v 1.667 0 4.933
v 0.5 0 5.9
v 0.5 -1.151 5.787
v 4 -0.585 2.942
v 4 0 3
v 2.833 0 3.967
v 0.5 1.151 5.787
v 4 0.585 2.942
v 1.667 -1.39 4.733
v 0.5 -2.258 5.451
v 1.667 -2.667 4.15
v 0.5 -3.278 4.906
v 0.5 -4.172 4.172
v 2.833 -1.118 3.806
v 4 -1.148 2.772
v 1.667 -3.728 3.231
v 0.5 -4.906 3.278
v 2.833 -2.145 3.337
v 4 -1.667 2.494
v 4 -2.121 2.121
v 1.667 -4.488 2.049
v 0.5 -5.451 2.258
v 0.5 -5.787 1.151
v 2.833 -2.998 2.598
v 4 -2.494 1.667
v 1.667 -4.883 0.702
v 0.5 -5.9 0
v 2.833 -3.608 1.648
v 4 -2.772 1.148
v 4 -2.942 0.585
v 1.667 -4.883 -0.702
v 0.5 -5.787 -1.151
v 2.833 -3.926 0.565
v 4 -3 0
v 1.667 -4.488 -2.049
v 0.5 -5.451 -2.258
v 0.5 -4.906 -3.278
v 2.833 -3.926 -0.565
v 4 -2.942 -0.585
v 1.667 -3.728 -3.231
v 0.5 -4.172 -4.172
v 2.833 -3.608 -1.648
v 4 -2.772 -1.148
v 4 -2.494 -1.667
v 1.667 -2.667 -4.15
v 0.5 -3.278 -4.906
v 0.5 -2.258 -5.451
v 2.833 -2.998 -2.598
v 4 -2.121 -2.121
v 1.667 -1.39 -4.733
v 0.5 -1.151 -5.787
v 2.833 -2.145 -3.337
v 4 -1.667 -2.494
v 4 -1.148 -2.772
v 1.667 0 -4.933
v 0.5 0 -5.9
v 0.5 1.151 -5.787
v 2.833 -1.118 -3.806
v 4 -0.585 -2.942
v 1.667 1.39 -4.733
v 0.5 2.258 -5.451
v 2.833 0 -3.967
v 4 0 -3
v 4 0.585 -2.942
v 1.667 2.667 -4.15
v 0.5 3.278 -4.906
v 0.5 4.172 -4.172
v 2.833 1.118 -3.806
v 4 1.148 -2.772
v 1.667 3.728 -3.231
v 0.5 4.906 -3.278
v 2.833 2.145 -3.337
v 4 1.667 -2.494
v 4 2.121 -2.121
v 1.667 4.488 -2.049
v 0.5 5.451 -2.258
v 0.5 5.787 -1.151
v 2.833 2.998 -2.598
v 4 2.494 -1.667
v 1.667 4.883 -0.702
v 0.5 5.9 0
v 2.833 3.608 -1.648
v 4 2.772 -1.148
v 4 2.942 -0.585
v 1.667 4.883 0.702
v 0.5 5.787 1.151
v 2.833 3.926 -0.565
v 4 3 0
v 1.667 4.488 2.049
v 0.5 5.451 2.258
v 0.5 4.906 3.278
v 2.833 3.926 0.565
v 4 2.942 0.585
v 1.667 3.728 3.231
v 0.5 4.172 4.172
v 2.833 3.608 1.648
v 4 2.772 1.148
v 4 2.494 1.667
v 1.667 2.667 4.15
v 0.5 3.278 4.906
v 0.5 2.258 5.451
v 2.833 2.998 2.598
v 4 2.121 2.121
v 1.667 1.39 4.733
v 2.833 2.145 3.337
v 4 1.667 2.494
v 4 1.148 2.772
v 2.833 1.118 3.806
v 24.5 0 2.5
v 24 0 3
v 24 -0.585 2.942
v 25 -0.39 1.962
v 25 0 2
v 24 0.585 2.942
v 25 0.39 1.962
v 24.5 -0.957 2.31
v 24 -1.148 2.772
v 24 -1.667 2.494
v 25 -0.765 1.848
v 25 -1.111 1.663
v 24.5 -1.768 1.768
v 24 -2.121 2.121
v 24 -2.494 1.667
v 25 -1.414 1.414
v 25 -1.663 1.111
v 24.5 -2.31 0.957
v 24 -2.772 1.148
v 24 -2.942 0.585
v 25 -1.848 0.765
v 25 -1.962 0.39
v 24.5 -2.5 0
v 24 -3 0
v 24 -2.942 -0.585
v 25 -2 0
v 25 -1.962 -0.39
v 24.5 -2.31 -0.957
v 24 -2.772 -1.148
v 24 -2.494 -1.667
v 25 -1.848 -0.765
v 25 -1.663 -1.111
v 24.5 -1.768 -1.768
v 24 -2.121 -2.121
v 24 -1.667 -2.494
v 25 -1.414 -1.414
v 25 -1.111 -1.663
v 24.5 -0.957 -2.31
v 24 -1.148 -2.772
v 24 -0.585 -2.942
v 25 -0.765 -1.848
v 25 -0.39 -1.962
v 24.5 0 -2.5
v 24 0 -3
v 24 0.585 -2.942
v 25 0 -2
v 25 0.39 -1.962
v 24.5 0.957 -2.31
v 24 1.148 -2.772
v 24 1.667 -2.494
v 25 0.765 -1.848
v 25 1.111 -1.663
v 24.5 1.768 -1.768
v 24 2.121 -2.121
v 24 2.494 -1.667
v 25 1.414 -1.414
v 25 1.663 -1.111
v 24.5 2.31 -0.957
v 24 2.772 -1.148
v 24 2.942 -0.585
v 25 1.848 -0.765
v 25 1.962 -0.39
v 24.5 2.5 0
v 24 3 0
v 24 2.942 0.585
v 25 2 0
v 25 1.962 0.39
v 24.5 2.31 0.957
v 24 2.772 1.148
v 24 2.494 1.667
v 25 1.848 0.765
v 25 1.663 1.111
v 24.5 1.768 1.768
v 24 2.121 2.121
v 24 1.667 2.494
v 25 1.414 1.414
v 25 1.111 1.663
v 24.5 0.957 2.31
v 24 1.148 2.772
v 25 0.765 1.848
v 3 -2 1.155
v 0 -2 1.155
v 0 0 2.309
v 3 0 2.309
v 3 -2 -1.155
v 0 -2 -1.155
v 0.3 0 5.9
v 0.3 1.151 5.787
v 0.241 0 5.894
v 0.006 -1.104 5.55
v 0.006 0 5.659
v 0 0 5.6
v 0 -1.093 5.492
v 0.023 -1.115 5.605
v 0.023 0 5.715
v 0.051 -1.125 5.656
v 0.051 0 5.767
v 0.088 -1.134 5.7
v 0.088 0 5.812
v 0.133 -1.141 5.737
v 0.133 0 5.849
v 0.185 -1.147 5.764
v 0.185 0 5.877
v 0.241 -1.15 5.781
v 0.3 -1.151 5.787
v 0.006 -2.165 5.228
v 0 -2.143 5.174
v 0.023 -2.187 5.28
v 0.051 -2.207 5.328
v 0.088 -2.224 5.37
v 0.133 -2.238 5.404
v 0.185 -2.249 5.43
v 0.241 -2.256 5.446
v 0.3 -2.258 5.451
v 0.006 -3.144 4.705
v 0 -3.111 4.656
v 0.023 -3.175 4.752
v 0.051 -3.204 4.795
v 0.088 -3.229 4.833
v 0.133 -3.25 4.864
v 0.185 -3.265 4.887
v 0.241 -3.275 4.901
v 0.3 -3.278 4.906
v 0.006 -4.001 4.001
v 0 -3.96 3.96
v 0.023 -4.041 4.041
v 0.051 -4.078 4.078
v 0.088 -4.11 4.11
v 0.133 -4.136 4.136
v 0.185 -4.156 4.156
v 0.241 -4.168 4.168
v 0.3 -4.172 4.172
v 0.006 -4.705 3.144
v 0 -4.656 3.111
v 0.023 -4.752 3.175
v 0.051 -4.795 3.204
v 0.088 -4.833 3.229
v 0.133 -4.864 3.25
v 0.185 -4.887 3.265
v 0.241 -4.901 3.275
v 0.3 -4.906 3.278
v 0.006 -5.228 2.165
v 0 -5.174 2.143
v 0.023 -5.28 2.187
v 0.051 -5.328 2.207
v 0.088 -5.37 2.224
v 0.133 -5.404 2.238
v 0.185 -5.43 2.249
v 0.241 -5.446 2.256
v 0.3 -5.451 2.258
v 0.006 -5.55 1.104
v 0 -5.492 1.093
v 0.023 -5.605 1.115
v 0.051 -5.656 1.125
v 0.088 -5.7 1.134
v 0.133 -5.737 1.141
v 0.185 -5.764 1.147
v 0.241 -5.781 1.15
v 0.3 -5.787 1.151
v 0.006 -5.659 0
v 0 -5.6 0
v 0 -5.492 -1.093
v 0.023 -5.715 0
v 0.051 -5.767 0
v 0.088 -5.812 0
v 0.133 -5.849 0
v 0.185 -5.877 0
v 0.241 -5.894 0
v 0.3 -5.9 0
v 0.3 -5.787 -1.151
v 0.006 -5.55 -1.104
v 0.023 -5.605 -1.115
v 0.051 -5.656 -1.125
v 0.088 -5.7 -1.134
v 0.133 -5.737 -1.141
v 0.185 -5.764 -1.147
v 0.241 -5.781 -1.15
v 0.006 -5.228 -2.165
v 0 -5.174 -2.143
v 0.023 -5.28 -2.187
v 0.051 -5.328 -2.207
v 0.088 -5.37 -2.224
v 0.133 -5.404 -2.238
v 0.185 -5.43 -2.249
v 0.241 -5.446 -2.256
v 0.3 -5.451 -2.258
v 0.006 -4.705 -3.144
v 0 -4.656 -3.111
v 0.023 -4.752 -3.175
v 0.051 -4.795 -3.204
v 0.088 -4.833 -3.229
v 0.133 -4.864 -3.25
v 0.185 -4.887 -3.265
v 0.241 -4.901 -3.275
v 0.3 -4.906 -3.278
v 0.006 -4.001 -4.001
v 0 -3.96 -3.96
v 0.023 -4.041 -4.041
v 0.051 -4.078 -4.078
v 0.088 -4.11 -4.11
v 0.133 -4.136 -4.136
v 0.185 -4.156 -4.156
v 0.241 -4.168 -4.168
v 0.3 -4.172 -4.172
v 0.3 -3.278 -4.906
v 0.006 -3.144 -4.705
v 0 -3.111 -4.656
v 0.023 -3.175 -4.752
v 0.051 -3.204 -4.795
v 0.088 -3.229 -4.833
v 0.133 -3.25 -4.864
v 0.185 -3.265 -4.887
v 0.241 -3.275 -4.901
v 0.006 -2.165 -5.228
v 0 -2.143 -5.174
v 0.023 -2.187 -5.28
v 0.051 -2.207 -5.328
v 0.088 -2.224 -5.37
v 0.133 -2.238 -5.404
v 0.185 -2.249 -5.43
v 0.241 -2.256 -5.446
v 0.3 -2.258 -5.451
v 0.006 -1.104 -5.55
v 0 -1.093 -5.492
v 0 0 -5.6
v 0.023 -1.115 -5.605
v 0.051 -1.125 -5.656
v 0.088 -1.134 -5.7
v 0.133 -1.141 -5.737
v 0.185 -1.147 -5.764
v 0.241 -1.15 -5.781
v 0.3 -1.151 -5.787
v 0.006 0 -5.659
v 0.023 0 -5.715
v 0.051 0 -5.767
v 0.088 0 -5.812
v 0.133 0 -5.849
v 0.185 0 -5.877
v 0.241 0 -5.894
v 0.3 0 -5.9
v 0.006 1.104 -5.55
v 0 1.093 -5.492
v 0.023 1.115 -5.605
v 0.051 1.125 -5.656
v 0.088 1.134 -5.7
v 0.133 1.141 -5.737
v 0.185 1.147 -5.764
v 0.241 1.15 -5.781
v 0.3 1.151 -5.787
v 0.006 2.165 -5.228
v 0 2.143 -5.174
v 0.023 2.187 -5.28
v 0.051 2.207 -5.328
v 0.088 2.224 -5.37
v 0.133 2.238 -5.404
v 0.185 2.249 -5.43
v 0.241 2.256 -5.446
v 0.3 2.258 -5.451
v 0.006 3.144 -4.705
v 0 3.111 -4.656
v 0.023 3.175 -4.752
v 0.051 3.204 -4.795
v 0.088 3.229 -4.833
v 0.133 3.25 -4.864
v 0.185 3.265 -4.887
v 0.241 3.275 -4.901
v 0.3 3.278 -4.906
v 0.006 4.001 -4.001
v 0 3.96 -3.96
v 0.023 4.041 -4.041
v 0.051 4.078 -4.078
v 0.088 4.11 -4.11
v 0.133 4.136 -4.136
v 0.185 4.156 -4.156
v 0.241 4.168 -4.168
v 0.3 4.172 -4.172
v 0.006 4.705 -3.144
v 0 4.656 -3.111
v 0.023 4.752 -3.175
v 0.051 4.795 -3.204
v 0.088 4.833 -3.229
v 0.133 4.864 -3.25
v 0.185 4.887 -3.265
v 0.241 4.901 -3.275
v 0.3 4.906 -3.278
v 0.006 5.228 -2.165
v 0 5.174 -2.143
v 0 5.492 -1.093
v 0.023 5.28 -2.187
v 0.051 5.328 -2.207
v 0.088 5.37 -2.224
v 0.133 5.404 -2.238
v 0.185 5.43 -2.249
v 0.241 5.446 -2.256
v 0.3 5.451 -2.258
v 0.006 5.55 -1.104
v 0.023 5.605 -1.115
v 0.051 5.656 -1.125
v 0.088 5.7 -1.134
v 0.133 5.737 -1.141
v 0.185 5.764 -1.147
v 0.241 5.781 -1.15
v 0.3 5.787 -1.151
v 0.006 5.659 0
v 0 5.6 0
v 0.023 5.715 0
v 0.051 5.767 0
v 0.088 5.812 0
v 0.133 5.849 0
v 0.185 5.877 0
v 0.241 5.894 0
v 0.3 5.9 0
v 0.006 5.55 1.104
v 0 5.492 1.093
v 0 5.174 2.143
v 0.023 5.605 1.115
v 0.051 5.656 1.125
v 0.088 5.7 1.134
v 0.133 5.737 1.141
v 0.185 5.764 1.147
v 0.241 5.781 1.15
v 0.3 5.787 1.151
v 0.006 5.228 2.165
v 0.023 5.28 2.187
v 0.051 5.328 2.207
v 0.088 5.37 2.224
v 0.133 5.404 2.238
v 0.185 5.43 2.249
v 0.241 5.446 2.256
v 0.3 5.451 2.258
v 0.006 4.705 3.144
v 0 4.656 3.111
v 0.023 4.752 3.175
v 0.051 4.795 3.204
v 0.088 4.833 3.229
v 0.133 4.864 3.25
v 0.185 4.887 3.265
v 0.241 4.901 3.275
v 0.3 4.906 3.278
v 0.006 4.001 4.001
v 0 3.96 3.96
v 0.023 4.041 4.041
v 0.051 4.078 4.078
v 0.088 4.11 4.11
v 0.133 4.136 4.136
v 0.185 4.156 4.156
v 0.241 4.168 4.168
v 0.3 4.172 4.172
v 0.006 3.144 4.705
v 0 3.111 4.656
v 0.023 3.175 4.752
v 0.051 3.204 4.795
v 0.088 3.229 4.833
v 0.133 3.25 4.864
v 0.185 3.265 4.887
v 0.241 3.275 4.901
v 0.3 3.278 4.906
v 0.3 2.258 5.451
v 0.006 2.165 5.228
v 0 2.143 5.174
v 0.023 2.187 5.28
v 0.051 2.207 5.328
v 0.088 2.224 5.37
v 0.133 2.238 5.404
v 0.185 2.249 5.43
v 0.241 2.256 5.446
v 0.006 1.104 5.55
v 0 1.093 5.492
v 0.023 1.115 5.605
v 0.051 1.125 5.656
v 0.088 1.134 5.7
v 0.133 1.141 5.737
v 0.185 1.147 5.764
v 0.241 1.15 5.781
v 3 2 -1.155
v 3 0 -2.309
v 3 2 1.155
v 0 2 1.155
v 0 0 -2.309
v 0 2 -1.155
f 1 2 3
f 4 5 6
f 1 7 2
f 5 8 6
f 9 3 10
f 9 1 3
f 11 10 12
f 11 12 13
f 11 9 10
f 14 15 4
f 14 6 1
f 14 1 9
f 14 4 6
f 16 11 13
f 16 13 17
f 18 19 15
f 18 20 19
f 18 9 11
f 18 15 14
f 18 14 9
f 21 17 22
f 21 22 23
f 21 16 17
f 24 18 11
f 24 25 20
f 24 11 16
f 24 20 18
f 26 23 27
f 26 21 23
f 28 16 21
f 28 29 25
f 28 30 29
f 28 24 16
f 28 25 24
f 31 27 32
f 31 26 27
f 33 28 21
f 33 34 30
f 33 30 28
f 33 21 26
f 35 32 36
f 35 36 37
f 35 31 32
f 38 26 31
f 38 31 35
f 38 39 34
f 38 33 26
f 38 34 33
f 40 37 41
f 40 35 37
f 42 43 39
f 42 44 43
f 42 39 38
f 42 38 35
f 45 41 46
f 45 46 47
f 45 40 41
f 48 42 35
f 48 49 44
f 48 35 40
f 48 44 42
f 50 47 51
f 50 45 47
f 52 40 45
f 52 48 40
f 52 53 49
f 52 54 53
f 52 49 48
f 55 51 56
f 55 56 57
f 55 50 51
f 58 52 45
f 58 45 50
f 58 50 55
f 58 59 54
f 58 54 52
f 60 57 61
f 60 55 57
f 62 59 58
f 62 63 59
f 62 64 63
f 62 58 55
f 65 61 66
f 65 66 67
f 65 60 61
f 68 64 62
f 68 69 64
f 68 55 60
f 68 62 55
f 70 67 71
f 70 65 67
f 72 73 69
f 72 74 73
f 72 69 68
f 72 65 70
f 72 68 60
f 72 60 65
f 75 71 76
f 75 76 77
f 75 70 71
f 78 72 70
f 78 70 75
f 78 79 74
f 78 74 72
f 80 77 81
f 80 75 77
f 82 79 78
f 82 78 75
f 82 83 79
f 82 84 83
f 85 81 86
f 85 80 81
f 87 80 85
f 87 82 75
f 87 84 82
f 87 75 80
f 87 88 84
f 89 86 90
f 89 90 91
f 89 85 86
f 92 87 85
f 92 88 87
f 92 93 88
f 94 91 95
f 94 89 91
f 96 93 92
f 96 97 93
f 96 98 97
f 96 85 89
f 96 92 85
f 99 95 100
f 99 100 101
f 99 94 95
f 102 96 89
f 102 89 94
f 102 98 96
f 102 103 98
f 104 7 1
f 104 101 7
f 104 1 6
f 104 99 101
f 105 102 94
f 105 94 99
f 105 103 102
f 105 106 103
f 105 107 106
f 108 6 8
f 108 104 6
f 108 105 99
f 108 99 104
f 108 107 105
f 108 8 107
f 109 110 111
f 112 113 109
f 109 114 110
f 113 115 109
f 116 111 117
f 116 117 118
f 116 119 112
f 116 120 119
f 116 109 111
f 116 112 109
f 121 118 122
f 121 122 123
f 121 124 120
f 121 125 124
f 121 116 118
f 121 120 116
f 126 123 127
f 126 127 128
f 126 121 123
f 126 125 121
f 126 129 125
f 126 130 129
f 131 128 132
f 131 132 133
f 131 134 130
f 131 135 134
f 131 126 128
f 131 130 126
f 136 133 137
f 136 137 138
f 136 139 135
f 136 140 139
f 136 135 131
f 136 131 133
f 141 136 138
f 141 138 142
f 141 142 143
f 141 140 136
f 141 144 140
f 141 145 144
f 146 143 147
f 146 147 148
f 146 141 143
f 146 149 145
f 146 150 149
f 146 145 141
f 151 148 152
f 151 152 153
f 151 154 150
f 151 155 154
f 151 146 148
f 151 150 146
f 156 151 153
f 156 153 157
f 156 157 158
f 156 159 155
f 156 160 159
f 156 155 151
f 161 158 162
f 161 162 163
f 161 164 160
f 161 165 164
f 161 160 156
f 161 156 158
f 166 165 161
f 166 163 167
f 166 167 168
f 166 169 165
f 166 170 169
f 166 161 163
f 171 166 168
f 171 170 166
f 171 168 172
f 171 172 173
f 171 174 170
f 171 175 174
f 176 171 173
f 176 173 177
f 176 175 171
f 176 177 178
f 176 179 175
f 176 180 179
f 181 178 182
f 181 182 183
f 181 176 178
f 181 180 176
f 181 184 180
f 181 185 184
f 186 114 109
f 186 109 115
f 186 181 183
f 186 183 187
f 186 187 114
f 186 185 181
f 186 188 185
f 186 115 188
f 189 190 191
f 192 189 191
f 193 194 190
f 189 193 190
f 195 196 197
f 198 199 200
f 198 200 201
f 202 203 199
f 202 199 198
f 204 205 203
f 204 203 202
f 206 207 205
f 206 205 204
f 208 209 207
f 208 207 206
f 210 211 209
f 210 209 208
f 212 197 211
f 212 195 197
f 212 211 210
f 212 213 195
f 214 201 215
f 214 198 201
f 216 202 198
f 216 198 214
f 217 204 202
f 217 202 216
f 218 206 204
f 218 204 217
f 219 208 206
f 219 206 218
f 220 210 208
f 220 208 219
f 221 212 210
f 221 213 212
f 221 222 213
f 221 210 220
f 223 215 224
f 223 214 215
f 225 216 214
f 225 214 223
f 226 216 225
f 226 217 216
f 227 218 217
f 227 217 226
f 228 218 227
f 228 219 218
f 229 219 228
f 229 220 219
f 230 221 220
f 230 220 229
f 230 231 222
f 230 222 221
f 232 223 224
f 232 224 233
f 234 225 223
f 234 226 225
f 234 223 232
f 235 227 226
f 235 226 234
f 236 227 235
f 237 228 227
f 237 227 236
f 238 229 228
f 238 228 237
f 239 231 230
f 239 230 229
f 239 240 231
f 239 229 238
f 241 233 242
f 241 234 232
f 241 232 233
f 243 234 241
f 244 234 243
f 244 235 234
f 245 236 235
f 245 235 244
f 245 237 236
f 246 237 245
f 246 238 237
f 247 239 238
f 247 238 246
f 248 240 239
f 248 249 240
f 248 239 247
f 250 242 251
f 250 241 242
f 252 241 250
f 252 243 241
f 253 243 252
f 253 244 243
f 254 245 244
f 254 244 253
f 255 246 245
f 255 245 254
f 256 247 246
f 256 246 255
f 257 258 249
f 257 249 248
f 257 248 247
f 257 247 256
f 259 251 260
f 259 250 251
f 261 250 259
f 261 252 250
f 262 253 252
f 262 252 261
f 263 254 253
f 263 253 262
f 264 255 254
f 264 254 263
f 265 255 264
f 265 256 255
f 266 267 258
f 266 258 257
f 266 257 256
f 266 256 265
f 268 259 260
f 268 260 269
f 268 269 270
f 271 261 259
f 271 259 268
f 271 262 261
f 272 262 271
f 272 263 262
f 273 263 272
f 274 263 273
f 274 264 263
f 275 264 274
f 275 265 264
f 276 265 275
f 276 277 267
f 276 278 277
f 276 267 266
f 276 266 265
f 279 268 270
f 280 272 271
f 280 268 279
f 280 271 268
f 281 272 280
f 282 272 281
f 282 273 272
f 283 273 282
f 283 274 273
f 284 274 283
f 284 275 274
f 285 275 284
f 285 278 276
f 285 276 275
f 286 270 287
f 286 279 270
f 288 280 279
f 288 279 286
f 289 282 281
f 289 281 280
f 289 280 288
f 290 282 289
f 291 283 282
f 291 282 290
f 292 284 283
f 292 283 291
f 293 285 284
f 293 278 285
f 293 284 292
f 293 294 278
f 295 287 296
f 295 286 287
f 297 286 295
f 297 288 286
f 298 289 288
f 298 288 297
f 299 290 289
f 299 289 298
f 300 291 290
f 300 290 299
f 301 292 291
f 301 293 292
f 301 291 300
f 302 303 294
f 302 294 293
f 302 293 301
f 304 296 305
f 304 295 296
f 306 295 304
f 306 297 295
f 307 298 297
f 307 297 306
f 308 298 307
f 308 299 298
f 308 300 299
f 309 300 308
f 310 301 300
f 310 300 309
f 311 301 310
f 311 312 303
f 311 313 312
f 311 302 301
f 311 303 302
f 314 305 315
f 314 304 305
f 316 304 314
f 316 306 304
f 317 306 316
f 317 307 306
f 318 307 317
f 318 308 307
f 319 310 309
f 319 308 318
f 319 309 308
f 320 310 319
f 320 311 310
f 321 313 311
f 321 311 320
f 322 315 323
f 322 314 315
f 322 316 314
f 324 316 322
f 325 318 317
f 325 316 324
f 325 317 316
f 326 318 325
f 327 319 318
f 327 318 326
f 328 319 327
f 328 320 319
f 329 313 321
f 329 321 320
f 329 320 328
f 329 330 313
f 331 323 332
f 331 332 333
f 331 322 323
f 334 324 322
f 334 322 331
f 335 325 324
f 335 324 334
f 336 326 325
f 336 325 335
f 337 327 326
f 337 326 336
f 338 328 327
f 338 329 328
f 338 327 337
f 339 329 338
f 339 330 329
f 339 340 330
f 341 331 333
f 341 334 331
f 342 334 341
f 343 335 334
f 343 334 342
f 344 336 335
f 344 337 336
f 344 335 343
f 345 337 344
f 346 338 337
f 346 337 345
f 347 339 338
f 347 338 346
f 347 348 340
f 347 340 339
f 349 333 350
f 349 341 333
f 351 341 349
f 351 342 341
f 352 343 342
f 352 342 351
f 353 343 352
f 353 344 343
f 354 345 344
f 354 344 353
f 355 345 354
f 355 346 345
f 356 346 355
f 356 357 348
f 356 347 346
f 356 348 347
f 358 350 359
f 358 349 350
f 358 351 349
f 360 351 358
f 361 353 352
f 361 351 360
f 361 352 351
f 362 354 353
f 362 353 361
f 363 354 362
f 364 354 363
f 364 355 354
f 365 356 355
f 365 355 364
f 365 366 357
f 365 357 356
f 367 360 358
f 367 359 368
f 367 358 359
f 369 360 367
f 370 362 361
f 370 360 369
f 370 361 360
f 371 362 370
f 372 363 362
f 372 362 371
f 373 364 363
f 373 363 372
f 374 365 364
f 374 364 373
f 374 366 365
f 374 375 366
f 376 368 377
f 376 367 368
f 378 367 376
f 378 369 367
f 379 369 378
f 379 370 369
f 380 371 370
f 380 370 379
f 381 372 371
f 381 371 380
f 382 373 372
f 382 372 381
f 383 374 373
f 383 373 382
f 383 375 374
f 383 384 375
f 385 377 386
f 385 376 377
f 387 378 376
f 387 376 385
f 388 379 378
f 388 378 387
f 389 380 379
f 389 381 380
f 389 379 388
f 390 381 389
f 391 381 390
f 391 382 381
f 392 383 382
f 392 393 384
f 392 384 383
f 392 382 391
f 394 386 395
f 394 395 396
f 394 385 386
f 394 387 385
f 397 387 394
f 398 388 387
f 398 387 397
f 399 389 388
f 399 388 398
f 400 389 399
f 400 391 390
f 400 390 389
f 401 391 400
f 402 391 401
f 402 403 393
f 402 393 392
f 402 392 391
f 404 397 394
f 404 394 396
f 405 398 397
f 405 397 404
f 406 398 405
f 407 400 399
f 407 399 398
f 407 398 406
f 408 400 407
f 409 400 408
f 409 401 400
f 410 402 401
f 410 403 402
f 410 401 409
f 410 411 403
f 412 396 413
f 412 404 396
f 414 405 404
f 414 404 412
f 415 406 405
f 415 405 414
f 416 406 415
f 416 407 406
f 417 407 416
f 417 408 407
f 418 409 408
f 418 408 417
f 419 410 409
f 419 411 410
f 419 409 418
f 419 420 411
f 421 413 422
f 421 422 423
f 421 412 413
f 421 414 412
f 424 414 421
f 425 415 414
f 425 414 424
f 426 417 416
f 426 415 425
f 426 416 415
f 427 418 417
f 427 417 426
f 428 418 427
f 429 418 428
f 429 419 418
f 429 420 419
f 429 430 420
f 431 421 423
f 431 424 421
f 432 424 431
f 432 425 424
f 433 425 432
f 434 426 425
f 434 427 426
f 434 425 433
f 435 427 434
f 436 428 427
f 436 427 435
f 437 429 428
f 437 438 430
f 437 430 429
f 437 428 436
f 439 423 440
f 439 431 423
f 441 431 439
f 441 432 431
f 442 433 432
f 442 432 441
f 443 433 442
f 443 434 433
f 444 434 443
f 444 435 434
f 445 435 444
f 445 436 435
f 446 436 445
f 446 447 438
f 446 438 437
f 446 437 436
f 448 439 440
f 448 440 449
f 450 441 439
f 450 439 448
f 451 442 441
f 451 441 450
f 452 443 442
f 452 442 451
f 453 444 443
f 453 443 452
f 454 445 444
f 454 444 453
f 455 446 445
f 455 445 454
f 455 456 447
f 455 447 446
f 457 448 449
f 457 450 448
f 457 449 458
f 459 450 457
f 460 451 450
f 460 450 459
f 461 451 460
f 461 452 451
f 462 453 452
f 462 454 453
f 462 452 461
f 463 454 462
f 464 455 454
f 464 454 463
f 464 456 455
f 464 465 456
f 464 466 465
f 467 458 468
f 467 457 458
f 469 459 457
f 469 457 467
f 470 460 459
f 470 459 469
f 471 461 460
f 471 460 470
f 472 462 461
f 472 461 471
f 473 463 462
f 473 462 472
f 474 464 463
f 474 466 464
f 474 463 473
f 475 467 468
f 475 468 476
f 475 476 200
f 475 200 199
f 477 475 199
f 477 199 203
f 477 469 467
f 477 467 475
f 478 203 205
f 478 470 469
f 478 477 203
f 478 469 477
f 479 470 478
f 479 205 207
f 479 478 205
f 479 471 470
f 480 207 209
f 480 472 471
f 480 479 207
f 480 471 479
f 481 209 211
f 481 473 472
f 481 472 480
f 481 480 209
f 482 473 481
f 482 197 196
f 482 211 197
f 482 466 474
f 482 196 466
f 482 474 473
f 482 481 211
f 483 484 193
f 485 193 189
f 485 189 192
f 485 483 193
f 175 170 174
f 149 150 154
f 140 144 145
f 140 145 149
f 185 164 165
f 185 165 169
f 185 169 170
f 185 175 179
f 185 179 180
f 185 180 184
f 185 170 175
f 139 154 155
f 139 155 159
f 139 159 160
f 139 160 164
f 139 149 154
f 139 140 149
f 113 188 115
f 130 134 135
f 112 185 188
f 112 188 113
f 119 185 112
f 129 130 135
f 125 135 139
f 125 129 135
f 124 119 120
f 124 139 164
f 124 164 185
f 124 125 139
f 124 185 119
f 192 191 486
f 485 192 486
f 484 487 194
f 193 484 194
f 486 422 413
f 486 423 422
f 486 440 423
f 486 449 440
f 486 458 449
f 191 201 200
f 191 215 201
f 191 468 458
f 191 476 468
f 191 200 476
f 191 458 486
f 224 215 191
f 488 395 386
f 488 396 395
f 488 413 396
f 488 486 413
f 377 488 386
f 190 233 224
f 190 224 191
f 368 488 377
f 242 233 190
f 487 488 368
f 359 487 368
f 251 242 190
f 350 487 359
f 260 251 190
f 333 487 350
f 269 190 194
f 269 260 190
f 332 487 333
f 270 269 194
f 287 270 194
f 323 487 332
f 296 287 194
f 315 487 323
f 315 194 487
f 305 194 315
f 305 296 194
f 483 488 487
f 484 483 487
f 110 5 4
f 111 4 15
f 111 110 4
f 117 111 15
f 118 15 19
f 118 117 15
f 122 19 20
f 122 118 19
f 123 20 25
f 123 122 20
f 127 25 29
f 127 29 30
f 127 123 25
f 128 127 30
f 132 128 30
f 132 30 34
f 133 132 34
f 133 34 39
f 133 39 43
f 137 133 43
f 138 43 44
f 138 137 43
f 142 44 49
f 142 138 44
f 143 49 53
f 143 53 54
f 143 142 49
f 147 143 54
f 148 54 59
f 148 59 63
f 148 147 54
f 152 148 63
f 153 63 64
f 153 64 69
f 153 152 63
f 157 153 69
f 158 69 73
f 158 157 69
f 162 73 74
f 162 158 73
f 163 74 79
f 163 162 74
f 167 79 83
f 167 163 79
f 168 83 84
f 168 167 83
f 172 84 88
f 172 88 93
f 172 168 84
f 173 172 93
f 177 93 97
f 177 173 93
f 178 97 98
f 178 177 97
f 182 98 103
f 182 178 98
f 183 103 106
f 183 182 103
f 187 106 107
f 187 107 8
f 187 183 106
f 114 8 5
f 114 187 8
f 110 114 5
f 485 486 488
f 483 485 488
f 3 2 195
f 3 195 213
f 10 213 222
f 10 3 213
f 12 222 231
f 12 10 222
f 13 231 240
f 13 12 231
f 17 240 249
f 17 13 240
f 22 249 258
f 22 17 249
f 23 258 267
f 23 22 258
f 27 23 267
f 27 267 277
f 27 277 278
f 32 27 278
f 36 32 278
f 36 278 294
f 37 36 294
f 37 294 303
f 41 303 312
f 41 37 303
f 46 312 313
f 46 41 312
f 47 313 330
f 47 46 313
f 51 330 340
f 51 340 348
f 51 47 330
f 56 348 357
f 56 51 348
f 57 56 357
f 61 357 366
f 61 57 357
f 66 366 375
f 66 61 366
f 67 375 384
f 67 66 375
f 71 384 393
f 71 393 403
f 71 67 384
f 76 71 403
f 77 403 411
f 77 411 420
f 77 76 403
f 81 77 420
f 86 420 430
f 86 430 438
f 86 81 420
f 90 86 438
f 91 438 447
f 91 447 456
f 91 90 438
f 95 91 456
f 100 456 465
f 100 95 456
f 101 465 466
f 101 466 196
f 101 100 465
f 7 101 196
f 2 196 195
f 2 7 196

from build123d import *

# Parameters (mm, degrees)
CUT_EXTRUDE_1_DEPTH = 3
FILLET_1_R          = 0.3
CHAMFER_1_SIZE      = 1


with BuildPart() as part:
    # Эскиз1 → Повернуть1 (revolve)
    with BuildSketch(Plane.XY, mode=Mode.PRIVATE) as revolve_1_sk:
        Polygon((0, 0), (0, 5.9), (0.5, 5.9), (4, 3), (25, 3), (25, 0), align=None)
    revolve(revolve_1_sk.sketch.rotate(Axis((0, 0, 0), (1, 0, 0)), 90), axis=Axis((0, 0, 0), (1, 0, 0)))  # turned: the seam where the file's is

    # Эскиз2 → Вырез-Вытянуть1 (cut)
    with BuildSketch(Plane.ZY):
        Polygon((1.154700538, 2), (-1.154700538, 2), (-2.309401077, 0), (-1.154700538, -2), (1.154700538, -2), (2.309401077, 0), align=None)
    extrude(amount=-CUT_EXTRUDE_1_DEPTH, mode=Mode.SUBTRACT)

    # Скругление1
    fillet_1_edges = [part.edges().sort_by_distance(p)[0] for p in [
        (0, 0, -5.9),
    ]]
    fillet(fillet_1_edges, radius=FILLET_1_R)

    # Фаска1
    chamfer_1_edges = [part.edges().sort_by_distance(p)[0] for p in [
        (25, 0, -3),
    ]]
    chamfer(chamfer_1_edges, length=CHAMFER_1_SIZE)


solid = part.part
